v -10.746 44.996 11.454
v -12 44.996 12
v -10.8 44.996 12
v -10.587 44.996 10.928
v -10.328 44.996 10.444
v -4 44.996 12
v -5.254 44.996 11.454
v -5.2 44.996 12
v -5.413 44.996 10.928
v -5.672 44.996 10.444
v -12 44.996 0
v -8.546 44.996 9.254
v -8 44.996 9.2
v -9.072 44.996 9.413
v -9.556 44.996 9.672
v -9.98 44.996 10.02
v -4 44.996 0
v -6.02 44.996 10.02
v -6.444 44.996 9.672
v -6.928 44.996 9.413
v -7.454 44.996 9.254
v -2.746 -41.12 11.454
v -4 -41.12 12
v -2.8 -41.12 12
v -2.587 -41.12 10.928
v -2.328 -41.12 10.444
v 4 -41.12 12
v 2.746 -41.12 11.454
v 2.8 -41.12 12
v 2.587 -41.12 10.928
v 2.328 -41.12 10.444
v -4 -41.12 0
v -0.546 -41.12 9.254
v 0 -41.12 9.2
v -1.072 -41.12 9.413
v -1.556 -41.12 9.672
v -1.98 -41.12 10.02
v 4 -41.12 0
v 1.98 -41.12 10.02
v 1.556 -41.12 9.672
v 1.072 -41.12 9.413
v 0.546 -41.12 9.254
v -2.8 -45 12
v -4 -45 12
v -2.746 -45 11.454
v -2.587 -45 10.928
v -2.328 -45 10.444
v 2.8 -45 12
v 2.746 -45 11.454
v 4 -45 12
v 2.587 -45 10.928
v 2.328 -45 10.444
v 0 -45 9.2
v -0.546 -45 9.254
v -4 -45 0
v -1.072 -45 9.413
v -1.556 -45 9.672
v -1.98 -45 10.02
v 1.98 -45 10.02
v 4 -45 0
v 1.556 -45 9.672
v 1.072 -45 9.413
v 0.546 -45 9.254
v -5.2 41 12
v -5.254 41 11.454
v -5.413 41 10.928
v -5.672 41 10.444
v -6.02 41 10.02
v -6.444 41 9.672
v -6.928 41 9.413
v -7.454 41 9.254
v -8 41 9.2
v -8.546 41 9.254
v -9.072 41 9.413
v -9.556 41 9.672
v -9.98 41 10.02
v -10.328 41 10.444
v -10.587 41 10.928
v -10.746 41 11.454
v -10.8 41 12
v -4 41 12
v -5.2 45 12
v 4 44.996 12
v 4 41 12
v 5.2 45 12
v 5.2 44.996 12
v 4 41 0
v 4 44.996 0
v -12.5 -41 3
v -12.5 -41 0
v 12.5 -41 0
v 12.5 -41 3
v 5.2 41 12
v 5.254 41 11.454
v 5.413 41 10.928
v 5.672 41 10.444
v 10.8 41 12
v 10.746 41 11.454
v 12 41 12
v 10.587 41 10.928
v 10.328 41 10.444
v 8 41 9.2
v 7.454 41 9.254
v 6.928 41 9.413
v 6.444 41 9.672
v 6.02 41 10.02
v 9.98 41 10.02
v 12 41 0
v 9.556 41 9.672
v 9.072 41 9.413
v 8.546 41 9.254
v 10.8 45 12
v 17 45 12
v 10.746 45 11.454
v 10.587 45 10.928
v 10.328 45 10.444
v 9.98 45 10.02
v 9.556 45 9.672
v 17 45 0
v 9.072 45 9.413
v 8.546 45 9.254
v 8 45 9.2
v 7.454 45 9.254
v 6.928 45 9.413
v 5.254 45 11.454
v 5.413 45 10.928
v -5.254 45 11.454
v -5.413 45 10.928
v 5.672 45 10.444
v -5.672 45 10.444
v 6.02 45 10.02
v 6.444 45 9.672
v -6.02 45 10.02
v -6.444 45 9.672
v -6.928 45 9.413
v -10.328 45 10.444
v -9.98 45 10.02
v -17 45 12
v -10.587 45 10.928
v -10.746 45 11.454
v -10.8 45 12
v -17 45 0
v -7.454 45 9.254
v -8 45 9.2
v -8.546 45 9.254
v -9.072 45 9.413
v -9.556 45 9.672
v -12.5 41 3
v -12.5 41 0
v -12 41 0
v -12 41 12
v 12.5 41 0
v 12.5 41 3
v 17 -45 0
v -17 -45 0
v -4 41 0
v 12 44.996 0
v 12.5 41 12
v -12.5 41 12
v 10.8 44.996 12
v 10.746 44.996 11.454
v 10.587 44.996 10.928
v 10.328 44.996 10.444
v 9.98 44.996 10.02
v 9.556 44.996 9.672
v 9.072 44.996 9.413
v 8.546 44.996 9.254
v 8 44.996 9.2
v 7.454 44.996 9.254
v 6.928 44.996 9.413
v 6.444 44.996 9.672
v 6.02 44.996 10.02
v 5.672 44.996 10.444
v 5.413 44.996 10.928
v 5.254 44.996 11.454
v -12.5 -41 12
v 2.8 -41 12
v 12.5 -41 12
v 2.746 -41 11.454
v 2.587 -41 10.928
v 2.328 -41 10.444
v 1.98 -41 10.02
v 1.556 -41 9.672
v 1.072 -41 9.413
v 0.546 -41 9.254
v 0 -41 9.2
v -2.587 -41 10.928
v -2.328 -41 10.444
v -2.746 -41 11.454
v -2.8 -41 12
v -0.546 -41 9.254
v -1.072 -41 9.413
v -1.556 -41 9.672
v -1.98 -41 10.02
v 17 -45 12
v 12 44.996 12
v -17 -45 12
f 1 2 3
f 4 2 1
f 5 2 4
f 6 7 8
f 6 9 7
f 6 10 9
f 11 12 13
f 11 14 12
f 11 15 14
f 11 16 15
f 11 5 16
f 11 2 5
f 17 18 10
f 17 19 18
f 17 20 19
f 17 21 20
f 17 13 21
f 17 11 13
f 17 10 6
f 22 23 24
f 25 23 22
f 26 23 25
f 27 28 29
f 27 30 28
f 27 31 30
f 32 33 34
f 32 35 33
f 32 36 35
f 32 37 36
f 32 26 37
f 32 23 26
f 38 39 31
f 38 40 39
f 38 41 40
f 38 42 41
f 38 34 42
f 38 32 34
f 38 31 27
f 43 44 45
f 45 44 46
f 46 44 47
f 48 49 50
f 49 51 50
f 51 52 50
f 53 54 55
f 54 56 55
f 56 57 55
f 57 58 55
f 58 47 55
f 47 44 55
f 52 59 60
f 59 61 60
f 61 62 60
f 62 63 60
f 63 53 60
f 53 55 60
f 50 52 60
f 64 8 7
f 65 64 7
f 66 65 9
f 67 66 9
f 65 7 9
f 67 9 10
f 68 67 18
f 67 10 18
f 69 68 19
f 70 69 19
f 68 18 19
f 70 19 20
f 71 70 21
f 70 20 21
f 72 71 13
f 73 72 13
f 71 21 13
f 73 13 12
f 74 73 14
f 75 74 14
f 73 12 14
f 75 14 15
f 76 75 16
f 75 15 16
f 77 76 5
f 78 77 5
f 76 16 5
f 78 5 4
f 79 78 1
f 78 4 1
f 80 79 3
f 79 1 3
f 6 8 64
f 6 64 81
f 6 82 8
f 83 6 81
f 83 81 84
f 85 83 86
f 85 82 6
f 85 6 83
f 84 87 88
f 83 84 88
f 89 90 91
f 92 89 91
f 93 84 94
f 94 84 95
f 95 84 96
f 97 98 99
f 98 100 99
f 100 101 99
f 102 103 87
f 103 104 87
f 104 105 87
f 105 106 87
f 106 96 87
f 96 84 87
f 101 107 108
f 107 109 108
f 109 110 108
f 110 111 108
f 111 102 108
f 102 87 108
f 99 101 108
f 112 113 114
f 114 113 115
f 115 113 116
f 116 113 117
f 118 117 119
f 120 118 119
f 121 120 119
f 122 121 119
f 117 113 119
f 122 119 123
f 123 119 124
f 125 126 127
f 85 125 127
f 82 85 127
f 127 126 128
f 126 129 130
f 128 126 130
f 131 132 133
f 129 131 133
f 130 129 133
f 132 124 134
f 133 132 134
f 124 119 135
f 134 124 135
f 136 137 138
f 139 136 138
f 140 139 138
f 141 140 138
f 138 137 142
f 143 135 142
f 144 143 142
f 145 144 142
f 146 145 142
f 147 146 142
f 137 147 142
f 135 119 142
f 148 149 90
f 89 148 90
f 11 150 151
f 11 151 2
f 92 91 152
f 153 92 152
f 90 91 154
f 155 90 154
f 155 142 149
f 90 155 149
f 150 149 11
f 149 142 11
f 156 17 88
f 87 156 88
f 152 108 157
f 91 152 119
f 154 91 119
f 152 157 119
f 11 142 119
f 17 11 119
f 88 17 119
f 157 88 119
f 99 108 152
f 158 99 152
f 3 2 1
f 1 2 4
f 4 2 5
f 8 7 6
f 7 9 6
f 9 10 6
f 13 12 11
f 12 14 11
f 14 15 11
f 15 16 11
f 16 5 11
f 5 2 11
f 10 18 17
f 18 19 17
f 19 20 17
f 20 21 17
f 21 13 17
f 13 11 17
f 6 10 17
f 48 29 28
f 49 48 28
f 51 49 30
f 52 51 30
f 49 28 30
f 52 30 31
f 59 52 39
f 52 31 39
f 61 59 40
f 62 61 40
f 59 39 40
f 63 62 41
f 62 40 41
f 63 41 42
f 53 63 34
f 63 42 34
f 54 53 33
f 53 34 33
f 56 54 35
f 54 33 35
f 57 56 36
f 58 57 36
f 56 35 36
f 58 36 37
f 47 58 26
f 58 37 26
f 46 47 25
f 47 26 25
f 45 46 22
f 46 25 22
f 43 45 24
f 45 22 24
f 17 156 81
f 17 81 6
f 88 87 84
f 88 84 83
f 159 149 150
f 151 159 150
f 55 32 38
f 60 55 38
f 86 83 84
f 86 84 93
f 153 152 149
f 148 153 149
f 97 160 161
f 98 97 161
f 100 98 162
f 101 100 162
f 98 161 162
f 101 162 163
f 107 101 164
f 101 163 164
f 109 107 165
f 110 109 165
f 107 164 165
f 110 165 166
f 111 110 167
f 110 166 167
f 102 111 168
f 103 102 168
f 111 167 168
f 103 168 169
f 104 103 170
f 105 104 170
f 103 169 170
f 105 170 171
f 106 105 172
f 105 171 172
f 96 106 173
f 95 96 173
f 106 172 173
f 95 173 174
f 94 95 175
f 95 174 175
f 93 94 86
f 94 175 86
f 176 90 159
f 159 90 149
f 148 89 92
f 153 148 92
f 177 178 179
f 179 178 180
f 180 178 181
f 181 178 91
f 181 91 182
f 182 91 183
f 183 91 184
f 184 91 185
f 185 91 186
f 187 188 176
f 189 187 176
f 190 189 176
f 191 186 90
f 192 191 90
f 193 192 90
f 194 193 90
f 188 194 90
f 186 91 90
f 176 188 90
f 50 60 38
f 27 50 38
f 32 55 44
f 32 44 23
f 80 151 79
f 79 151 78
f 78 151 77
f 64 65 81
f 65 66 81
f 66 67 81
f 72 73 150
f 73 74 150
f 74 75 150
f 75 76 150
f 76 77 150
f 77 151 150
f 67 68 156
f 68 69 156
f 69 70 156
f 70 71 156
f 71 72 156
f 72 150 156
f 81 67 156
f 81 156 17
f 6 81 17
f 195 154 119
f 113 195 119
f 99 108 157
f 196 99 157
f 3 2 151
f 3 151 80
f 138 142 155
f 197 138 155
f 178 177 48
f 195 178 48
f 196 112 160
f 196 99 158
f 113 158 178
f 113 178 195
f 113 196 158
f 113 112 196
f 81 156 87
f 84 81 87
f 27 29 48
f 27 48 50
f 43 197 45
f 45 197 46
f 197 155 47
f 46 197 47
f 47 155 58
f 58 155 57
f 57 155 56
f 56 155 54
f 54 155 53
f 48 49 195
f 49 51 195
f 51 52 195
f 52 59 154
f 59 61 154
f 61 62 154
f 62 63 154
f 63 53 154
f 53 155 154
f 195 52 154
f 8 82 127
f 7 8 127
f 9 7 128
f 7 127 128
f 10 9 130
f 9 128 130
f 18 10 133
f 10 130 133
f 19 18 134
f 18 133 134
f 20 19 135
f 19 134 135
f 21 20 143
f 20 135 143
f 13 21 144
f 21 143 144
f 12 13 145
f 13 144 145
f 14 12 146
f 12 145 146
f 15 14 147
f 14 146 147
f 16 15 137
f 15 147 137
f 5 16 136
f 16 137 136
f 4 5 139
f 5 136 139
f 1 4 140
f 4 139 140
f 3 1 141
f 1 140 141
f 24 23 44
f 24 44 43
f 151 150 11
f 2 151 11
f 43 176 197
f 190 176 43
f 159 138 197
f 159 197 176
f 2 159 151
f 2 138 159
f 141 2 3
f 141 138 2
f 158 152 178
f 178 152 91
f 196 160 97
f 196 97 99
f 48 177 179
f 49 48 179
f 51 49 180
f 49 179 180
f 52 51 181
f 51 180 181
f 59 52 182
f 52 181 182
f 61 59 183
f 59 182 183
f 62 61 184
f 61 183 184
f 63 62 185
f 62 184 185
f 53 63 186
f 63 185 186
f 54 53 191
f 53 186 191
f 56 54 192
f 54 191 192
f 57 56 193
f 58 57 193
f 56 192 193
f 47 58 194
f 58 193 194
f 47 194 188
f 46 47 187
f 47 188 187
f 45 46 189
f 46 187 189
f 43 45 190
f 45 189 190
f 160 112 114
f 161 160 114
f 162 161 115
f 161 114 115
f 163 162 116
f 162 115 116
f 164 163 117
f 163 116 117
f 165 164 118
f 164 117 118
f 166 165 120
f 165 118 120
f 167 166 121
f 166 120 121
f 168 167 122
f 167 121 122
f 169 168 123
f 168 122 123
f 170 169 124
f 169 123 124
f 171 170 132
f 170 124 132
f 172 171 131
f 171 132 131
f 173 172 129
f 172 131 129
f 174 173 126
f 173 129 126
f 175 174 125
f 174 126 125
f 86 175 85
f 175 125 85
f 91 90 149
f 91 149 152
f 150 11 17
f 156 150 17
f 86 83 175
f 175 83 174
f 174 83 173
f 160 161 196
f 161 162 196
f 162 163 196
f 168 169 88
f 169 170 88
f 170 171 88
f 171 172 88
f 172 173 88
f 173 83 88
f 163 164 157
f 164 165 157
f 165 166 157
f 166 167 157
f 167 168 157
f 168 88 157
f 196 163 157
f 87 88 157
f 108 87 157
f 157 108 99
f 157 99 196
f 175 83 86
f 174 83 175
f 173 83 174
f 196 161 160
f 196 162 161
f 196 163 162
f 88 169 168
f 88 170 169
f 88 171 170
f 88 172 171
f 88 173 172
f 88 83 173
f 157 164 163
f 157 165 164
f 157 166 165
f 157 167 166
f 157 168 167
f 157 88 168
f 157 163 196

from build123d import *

# Parameters (mm, degrees)
F0_W       = 8
F0_H       = 3.880266
F0_H_2     = 3.995562
F1_DEPTH   = 12
F0_W_2     = 0.5
F3_DEPTH   = 12
F4_D       = 5.6
F4_DEPTH   = 20
F4_2_D     = 5.6
F4_2_DEPTH = 20
F7_D       = 5.6
F7_DEPTH   = 20
F7_2_D     = 5.6
F7_2_DEPTH = 20
F8_D       = 5.6
F8_DEPTH   = 20
F8_2_D     = 5.6
F8_2_DEPTH = 20
F9_DEPTH   = 3


with BuildPart() as f1:
    # F0 (on Top) → F1 (new body)
    with BuildSketch(Plane.XY):
        with Locations((0, -43.059867)):
            Rectangle(F0_W, F0_H)
        with Locations((-8, 42.997781)):
            Rectangle(F0_W, F0_H_2)
        with Locations((8, 42.997781)):
            Rectangle(F0_W, F0_H_2)
    extrude(amount=F1_DEPTH)

    # F4
    with Locations(Plane.XZ.offset(45)):
        with Locations((0, 12)):
            Hole(F4_D / 2, depth=F4_DEPTH)

    # F7
    with Locations(Plane.XZ.offset(-41)):
        with Locations((8, 12)):
            Hole(F7_D / 2, depth=F7_DEPTH)

    # F8
    with Locations(Plane.XZ.offset(-41)):
        with Locations((-8, 12)):
            Hole(F8_D / 2, depth=F8_DEPTH)


with BuildPart() as f3:
    # F0 (on Top) → F3 (new body)
    with BuildSketch(Plane.XY):
        with Locations((0, -43.059867)):
            Rectangle(F0_W, F0_H)
        Polygon((4, -45), (17, -45), (17, 45), (-17, 45), (-17, -45), (-4, -45), (-4, -41.119734), (4, -41.119734), align=None)
        Polygon((12.5, 44.995562), (12.5, 41), (12.5, -41), (-12.5, -41), (-12.5, 41), (-12, 41), (-12, 44.995562), (-4, 44.995562), (4, 44.995562), (12, 44.995562), align=None, mode=Mode.SUBTRACT)
        with Locations((12.25, 42.997781)):
            Rectangle(F0_W_2, F0_H_2)
        with Locations((0, 42.997781)):
            Rectangle(F0_W, F0_H_2)
    extrude(amount=F3_DEPTH)

    # F4#2
    with Locations(Plane.XZ.offset(45)):
        with Locations((0, 12)):
            Hole(F4_2_D / 2, depth=F4_2_DEPTH)

    # F7#2
    with Locations(Plane.XZ.offset(-41)):
        with Locations((8, 12)):
            Hole(F7_2_D / 2, depth=F7_2_DEPTH)

    # F8#2
    with Locations(Plane.XZ.offset(-41)):
        with Locations((-8, 12)):
            Hole(F8_2_D / 2, depth=F8_2_DEPTH)


with BuildPart() as f9:
    # F0 (on Top) → F9 (new body)
    with BuildSketch(Plane.XY):
        Polygon((12.5, -41), (12.5, 41), (12, 41), (4, 41), (-4, 41), (-12, 41), (-12.5, 41), (-12.5, -41), align=None)
    extrude(amount=F9_DEPTH)


solid = Compound([f1.part, f3.part, f9.part])
